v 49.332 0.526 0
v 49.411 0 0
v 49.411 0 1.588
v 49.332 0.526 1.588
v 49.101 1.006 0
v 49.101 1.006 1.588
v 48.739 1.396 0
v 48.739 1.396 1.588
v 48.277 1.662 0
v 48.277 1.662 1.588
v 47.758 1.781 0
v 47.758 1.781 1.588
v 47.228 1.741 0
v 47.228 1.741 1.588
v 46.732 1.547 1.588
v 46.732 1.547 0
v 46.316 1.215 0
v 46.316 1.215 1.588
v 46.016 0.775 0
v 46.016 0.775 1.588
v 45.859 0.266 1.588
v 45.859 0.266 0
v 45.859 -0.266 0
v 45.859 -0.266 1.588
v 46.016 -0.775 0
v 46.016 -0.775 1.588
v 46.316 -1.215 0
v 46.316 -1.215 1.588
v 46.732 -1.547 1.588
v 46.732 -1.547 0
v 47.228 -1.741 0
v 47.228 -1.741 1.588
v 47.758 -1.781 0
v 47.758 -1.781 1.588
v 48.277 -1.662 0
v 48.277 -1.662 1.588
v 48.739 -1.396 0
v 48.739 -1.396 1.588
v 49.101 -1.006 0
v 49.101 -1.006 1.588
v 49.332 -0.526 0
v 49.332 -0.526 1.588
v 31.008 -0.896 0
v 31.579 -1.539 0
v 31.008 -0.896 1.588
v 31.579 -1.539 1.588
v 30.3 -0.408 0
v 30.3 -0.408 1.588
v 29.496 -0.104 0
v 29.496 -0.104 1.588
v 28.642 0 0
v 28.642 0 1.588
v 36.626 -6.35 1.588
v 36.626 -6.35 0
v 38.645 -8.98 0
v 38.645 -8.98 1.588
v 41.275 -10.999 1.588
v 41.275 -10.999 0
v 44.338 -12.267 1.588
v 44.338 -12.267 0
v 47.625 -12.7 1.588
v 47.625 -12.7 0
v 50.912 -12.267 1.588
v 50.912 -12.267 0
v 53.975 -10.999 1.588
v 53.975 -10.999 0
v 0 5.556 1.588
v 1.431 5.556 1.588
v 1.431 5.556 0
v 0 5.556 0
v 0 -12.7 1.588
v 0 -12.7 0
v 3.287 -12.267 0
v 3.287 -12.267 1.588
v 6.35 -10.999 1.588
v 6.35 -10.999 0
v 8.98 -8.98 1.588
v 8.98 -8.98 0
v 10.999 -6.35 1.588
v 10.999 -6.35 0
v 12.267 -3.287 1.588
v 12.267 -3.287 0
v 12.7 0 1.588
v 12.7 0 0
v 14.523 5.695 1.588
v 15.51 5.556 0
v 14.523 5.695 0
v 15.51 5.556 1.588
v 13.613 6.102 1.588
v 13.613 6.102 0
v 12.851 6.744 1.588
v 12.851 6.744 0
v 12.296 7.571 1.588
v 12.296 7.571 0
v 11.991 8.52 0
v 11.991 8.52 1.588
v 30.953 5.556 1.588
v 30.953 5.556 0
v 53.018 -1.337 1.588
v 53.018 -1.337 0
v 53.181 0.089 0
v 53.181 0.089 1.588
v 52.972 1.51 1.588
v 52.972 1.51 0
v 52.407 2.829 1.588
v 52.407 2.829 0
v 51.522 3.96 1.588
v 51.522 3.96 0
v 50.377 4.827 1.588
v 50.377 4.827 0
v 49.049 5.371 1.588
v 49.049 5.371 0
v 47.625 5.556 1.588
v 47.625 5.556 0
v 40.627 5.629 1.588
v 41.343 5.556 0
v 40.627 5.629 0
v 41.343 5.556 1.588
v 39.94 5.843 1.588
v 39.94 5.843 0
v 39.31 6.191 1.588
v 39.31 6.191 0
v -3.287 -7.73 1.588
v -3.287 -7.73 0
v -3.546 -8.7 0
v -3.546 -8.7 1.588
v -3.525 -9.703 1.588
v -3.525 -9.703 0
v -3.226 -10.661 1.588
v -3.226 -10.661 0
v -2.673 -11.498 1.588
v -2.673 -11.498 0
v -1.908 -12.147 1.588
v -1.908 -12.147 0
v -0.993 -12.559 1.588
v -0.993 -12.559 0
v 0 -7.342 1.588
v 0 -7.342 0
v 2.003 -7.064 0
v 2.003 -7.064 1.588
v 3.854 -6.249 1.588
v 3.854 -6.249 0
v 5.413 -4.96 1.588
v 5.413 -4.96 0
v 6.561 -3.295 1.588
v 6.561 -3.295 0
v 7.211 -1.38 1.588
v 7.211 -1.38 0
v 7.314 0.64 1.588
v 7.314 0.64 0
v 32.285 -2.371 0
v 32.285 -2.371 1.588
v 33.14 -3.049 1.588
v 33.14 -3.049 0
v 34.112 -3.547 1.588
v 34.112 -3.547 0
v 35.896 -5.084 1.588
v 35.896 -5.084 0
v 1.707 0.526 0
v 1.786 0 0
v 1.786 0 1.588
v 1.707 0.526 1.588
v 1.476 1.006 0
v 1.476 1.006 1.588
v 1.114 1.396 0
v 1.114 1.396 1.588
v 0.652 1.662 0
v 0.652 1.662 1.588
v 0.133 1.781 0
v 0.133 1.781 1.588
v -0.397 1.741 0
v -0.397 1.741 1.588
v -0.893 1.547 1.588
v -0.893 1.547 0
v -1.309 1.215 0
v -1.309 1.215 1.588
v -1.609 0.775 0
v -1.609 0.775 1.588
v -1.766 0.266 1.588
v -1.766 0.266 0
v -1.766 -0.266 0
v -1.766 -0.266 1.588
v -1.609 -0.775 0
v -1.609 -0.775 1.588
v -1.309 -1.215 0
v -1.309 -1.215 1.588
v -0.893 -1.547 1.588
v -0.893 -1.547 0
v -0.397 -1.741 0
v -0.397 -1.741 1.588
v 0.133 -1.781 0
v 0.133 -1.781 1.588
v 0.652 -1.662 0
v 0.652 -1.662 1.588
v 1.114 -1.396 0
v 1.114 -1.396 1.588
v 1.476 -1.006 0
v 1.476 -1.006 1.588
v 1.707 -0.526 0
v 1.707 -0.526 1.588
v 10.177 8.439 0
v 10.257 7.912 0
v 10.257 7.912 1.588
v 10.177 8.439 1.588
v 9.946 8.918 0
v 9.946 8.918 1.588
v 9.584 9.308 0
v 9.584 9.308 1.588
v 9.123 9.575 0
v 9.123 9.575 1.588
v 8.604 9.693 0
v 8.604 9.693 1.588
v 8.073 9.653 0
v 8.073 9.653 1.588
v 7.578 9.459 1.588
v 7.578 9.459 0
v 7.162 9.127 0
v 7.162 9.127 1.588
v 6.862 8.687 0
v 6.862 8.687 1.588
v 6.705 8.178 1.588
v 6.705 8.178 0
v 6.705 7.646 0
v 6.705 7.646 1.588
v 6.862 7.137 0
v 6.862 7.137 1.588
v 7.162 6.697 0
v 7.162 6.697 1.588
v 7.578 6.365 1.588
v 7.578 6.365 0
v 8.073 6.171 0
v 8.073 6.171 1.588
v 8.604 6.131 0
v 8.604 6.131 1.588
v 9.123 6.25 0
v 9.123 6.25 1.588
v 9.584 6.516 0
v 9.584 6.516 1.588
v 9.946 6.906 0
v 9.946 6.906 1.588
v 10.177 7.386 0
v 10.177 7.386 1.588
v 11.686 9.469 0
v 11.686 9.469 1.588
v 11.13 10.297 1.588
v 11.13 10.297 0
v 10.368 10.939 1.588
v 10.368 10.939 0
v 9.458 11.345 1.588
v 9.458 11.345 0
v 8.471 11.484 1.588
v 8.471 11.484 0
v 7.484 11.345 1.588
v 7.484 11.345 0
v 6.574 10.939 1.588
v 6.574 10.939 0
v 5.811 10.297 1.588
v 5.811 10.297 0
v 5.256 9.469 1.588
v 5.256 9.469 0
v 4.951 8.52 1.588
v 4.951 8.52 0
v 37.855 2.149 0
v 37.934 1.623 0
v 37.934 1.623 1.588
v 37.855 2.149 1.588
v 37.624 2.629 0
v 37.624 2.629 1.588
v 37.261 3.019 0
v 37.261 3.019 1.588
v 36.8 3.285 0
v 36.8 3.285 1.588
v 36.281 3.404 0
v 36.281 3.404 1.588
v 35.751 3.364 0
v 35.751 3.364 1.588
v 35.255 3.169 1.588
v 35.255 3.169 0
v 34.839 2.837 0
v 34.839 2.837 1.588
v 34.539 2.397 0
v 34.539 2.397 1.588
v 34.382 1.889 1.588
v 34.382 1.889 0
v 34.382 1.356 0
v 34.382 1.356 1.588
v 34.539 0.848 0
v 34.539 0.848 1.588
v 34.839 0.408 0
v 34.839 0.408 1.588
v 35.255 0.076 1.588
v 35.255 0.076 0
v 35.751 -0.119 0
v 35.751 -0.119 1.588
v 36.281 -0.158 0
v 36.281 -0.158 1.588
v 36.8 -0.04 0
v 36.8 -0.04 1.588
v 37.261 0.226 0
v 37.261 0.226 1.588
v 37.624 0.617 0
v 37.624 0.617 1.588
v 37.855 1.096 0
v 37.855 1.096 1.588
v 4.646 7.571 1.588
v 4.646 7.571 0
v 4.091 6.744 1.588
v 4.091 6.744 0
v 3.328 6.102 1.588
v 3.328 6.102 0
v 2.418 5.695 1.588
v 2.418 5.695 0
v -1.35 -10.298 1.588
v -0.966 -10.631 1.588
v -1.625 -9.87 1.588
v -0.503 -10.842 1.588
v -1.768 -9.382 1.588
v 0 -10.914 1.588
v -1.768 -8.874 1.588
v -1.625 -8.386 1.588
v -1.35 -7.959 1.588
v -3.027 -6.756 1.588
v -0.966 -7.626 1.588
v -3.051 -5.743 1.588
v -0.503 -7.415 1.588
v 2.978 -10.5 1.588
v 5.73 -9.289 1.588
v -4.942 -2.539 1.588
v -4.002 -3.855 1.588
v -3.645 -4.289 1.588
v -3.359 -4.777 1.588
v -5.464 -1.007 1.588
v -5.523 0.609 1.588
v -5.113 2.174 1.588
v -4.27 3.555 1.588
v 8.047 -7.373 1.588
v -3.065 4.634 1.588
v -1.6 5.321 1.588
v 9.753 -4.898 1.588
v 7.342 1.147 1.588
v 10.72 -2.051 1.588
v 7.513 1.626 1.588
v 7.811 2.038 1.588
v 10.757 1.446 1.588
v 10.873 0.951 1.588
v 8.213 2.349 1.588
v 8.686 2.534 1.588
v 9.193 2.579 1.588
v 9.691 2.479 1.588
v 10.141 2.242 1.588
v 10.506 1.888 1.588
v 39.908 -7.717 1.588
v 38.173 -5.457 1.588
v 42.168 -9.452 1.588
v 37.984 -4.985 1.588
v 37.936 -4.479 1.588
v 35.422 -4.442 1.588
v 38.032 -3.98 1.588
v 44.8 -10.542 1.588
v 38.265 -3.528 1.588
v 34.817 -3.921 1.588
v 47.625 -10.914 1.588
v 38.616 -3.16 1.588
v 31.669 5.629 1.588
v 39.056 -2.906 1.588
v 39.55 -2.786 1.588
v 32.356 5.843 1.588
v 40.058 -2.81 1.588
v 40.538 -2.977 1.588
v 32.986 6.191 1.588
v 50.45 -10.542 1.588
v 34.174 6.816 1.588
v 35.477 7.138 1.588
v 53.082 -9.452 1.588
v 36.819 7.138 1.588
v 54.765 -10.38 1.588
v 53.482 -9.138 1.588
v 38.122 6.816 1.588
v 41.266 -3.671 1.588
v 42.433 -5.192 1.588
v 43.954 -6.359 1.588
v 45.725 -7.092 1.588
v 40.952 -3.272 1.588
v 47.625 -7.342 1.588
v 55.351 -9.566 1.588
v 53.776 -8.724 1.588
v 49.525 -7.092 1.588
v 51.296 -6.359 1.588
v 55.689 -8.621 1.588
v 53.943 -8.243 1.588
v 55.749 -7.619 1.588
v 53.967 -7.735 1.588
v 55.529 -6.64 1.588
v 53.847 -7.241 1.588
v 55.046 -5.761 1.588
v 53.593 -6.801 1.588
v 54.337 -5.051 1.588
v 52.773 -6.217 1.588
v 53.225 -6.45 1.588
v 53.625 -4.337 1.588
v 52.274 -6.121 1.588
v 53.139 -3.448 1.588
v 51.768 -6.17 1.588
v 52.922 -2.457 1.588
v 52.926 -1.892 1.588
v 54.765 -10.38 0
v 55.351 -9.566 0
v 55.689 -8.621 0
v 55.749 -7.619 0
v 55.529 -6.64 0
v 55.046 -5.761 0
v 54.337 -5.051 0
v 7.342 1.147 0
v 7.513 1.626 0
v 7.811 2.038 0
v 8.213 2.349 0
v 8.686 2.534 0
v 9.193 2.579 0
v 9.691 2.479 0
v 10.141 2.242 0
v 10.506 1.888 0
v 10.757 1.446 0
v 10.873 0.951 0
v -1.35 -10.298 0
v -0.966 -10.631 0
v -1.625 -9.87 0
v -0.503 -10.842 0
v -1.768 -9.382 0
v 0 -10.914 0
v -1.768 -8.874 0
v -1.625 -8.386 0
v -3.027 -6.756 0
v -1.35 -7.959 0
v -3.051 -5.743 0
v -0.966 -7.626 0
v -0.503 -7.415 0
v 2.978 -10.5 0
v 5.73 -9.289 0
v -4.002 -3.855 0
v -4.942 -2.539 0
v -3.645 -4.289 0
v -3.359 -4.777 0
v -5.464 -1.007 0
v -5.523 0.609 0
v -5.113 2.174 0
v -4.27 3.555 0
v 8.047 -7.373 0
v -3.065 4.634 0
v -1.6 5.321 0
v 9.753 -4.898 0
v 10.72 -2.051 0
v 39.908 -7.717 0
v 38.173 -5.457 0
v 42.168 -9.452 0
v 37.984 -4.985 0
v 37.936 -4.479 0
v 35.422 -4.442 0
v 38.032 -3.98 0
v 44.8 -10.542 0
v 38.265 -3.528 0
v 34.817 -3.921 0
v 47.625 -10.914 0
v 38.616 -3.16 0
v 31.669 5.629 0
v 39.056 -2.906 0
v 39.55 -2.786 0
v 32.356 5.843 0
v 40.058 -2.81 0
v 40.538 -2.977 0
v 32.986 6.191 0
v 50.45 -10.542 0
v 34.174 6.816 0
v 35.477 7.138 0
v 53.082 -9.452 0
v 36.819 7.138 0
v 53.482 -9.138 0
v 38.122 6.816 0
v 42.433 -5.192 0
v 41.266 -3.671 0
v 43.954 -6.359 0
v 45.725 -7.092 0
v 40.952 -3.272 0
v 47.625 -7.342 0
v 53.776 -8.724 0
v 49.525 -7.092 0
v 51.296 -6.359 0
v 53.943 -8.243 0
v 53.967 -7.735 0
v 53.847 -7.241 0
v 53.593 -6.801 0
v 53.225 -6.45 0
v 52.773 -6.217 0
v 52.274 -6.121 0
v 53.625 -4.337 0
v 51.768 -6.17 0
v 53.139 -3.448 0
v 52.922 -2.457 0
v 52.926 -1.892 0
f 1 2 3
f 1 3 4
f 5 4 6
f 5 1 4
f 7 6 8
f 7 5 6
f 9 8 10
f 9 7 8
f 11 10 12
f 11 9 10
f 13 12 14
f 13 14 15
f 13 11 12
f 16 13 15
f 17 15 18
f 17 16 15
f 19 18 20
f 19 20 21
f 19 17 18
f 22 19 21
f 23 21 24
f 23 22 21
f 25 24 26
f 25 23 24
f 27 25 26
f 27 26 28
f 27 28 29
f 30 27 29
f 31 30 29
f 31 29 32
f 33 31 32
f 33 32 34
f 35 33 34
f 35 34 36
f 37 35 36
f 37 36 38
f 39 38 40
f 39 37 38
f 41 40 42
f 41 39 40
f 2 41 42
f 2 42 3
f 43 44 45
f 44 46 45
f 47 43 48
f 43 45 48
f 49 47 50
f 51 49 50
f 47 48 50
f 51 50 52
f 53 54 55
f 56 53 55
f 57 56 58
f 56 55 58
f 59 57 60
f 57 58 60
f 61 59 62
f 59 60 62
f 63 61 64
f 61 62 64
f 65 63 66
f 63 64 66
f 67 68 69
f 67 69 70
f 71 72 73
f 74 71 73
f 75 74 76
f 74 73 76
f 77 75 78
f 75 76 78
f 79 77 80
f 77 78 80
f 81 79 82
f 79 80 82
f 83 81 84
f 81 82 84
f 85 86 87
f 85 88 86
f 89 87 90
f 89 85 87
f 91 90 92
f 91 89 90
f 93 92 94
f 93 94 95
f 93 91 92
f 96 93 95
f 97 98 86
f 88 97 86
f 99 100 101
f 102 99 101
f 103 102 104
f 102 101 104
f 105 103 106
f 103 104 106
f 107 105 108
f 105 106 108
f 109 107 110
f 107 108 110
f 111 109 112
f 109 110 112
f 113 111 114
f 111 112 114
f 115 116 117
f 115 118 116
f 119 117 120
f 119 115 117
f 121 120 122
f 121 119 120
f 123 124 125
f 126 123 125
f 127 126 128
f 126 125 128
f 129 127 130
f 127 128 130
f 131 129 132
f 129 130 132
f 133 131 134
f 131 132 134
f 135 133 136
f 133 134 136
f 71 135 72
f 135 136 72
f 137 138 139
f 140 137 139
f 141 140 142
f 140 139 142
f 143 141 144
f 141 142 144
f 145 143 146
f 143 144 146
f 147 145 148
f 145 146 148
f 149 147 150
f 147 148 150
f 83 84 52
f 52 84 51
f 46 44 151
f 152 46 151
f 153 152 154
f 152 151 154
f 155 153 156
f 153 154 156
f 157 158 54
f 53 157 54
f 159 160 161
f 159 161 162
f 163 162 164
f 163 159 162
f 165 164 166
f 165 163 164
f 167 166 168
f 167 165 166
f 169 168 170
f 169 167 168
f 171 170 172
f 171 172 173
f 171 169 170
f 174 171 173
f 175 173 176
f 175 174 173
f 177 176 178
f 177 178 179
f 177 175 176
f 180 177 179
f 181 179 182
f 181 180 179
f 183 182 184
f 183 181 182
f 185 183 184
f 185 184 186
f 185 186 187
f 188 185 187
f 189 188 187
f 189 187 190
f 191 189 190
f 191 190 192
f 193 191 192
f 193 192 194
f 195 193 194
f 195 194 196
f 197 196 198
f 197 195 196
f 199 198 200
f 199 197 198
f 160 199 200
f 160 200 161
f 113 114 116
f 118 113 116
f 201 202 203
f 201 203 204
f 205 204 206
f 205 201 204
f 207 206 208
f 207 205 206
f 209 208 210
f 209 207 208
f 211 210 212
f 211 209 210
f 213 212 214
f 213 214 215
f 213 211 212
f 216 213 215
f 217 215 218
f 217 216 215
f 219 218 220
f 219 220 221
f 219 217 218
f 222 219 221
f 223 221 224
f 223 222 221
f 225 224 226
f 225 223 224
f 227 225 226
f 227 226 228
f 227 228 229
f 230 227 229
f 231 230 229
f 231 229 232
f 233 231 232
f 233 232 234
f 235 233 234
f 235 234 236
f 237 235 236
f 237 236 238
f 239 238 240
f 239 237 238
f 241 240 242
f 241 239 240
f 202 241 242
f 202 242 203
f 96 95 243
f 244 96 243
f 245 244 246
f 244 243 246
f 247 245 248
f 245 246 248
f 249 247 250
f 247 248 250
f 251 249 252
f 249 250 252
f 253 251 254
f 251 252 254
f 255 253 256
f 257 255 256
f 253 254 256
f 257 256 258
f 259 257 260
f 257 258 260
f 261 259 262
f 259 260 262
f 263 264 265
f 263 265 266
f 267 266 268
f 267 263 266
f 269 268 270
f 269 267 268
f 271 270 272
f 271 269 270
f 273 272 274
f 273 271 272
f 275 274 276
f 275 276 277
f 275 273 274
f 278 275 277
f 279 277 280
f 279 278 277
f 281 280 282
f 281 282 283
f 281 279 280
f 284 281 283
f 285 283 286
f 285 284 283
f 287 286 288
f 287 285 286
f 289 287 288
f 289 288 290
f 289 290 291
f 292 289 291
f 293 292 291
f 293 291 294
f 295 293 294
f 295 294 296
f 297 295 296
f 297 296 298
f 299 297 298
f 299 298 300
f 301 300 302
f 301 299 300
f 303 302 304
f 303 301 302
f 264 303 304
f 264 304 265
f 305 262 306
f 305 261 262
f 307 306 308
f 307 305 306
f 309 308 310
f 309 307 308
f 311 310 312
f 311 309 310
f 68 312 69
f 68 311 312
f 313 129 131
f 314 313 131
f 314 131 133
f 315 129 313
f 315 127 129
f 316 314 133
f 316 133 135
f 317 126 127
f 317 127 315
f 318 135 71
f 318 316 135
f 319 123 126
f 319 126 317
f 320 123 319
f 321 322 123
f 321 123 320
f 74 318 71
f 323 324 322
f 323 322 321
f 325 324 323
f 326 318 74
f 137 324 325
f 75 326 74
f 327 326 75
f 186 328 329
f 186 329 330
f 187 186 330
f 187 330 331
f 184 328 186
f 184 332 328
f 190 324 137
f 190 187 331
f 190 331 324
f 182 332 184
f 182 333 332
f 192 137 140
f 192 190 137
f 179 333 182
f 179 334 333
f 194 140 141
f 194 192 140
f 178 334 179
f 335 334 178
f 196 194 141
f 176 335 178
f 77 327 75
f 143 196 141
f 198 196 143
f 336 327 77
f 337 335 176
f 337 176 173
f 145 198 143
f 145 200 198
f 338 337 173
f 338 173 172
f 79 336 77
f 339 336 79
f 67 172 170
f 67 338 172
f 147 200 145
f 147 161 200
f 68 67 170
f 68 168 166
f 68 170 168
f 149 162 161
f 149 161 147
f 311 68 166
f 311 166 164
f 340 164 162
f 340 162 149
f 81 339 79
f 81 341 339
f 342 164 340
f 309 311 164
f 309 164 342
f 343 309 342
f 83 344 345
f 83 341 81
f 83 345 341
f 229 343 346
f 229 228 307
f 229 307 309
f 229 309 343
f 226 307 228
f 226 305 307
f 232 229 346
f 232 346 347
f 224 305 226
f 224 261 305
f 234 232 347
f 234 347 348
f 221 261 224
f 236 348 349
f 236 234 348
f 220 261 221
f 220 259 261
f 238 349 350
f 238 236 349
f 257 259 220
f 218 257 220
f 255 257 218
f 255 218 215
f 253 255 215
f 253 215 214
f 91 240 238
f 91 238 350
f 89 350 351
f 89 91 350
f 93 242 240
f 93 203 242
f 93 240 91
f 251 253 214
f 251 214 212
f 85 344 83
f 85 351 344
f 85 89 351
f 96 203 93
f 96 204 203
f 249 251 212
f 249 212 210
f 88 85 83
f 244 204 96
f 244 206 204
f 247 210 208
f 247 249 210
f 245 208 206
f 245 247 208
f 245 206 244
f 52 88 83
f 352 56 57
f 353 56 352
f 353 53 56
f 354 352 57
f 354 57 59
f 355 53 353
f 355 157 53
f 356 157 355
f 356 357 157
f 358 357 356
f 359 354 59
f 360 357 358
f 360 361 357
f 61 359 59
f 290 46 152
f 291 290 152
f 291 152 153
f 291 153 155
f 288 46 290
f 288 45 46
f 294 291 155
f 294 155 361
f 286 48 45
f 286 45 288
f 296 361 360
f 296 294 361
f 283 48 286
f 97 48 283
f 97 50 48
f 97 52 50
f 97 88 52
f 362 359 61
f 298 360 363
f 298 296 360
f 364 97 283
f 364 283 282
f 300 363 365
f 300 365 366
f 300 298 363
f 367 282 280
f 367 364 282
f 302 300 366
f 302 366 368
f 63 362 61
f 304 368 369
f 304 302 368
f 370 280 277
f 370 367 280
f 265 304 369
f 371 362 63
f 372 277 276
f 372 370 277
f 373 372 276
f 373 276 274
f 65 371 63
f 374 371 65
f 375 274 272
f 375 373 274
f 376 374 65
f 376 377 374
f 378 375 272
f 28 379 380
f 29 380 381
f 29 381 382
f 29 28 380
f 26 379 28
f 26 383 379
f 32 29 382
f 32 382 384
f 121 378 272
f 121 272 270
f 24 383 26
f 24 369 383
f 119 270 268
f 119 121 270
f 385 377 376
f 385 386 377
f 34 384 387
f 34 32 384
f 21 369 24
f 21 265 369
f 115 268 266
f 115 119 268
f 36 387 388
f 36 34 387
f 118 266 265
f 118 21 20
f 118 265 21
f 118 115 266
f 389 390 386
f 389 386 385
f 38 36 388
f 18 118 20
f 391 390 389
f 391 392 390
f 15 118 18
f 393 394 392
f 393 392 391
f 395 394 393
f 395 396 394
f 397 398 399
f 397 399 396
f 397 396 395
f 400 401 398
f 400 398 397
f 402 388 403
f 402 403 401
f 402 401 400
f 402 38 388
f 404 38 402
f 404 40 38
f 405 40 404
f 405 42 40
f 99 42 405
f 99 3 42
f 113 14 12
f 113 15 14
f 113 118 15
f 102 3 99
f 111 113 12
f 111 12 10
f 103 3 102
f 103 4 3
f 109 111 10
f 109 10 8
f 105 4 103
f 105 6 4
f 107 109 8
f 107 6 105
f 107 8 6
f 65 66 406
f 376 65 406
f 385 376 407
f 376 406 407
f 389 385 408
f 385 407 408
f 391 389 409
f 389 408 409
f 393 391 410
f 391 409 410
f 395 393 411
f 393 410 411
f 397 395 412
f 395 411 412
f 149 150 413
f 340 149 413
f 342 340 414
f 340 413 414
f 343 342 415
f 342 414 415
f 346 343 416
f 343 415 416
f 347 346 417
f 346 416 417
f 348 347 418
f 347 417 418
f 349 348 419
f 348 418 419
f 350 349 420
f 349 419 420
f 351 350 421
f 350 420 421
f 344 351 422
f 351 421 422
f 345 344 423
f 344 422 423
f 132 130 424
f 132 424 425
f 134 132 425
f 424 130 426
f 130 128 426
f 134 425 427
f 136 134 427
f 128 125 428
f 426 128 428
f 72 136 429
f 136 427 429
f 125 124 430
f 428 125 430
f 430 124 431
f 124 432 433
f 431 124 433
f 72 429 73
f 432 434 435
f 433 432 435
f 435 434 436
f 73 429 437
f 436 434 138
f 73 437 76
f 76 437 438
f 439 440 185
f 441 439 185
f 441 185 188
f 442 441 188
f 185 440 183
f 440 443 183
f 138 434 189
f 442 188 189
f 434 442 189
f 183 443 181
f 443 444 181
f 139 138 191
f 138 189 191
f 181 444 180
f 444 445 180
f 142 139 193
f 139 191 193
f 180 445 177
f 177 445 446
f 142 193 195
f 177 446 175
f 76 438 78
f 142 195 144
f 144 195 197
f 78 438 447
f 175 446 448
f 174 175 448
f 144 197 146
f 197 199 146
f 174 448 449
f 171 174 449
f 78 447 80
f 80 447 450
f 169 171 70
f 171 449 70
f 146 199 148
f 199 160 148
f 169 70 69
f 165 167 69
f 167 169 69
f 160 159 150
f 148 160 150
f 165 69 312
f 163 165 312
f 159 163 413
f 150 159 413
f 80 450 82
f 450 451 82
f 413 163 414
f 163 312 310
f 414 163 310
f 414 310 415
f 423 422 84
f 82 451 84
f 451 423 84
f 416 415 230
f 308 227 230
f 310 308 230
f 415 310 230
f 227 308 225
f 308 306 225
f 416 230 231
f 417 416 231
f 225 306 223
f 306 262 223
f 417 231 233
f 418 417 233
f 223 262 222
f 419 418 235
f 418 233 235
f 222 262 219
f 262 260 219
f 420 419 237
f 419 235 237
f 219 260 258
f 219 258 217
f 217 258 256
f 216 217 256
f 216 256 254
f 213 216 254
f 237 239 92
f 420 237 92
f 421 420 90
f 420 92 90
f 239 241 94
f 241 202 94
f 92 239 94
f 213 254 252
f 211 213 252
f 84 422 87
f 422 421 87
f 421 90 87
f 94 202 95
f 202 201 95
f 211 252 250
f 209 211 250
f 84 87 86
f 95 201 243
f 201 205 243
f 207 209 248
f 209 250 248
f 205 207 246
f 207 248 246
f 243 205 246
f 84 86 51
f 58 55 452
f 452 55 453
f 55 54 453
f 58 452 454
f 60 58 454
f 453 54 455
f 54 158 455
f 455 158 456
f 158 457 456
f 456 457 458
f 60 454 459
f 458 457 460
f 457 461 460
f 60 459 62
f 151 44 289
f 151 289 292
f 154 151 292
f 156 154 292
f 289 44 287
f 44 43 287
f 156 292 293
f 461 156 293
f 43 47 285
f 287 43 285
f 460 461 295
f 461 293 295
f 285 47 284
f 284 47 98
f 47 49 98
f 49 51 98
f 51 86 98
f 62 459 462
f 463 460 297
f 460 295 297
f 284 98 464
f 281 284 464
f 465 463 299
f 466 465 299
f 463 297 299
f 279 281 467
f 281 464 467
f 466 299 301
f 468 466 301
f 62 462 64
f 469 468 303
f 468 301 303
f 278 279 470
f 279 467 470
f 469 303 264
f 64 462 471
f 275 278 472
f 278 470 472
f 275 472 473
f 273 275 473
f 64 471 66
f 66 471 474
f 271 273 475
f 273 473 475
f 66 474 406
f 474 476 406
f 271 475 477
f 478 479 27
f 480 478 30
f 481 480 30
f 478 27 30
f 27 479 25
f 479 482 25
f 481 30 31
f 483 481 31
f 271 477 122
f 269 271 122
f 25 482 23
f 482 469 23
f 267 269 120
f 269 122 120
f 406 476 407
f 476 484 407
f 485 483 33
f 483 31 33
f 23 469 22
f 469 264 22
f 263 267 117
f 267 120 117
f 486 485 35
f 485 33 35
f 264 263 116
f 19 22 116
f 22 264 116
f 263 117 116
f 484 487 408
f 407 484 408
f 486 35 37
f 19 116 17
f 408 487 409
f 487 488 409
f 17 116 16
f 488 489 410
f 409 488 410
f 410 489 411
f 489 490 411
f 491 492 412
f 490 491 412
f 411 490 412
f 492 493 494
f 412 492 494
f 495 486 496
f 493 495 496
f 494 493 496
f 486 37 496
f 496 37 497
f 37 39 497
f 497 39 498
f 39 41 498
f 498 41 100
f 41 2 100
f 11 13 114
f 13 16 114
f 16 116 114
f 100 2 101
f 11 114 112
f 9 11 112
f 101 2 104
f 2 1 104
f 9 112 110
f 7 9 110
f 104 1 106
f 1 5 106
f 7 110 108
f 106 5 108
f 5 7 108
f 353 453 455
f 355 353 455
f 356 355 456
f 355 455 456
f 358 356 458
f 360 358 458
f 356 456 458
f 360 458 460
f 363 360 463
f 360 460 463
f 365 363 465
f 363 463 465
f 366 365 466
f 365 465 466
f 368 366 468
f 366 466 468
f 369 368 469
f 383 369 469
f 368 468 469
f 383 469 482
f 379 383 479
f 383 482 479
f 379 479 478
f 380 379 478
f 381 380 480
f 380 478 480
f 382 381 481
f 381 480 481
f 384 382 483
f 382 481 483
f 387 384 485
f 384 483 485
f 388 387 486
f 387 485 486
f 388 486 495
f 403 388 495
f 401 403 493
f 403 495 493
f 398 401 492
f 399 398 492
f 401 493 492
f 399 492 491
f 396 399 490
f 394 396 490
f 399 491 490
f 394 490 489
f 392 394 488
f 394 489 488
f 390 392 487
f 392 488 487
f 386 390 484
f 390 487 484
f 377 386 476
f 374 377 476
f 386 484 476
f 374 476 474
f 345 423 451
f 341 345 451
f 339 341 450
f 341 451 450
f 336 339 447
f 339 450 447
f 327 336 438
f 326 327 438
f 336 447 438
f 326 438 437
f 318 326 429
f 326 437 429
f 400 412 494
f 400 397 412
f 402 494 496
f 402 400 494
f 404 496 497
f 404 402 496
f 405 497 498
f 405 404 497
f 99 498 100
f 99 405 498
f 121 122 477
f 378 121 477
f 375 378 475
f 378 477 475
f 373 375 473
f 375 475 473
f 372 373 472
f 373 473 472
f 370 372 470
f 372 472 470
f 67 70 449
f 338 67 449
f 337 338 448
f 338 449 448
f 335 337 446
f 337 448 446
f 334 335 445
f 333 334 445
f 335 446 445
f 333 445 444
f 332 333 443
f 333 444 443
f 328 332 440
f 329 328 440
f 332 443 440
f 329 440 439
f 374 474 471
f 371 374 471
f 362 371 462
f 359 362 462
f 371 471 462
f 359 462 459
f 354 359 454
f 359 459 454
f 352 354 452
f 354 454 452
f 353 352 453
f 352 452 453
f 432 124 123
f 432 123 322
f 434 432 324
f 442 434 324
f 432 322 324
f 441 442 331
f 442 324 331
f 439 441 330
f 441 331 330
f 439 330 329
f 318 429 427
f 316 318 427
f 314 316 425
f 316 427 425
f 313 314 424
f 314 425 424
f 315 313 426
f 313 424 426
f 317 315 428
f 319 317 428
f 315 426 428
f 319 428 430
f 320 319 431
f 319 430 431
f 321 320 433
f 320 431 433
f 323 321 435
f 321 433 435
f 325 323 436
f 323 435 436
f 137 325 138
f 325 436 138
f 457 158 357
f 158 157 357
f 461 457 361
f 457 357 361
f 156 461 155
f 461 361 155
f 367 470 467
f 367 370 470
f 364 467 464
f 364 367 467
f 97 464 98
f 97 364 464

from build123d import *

# Parameters (mm, degrees)
SKETCH1_R           = 1.7859375
BOSS_EXTRUDE1_DEPTH = 1.5875
FILLET1_R           = 3.571875


with BuildPart() as part:
    # Sketch1 → Boss-Extrude1 (new body)
    with BuildSketch(Plane.XY):
        with BuildLine():
            ThreePointArc((53.975, -10.998522628), (55.282397014, -6.119250683), (50.403125088, -4.811853599))
            ThreePointArc((50.403125088, -4.811853599), (52.991925359, 1.438063368), (47.625, 5.55625))
            Line((47.625, 5.55625), (40.072011619, 5.55625))
            ThreePointArc((40.072011619, 5.55625), (36.147936861, 7.178856478), (32.223862103, 5.55625))
            Line((32.223862103, 5.55625), (11.155561342, 5.55625))
            ThreePointArc((11.155561342, 5.55625), (8.470770891, 11.484009389), (5.785980441, 5.55625))
            Line((5.785980441, 5.55625), (0, 5.55625))
            ThreePointArc((0, 5.55625), (-5.55625, 0), (0, -5.55625))
            ThreePointArc((0, -5.55625), (-3.571875, -9.128125), (0, -12.7))
            ThreePointArc((0, -12.7), (8.980256121, -8.980256121), (12.7, 0))
            Line((12.7, 0), (30.833892989, 0))
            ThreePointArc((30.833892989, 0), (32.465327803, -2.537958939), (35.182607485, -3.849143997))
            Line((35.182607485, -3.849143997), (36.626477372, -6.35))
            ThreePointArc((36.626477372, -6.35), (44.337998127, -12.267257994), (53.975, -10.998522628))
        make_face()
        with BuildLine():
            ThreePointArc((0, -10.9140625), (-1.7859375, -9.128125), (0, -7.3421875))
            ThreePointArc((0, -7.3421875), (5.413228446, -4.960309977), (7.31424826, 0.639913805))
            ThreePointArc((7.31424826, 0.639913805), (8.937735019, 2.574709983), (10.872531197, 0.951223224))
            ThreePointArc((10.872531197, 0.951223224), (8.046690934, -7.37343375), (0, -10.9140625))
        make_face(mode=Mode.SUBTRACT)
        with BuildLine():
            ThreePointArc((51.29609375, -6.358520894), (53.735729745, -7.012219389), (53.08203125, -9.451855383))
            ThreePointArc((53.08203125, -9.451855383), (44.800232766, -10.542174838), (38.173144617, -5.45703125))
            ThreePointArc((38.173144617, -5.45703125), (38.826843111, -3.017395255), (41.266479106, -3.67109375))
            ThreePointArc((41.266479106, -3.67109375), (45.724702042, -7.092008528), (51.29609375, -6.358520894))
        make_face(mode=Mode.SUBTRACT)
        Circle(SKETCH1_R, mode=Mode.SUBTRACT)
        with Locations((8.470770891, 7.912134389)):
            Circle(SKETCH1_R, mode=Mode.SUBTRACT)
        with Locations((36.147936861, 1.622606478)):
            Circle(SKETCH1_R, mode=Mode.SUBTRACT)
        with Locations((47.625, 0)):
            Circle(SKETCH1_R, mode=Mode.SUBTRACT)
    extrude(amount=BOSS_EXTRUDE1_DEPTH)

    # Fillet1
    fillet1_edges = [part.edges().sort_by_distance(p)[0] for p in [
        (5.785980441, 5.55625, 0.79375),
        (11.155561342, 5.55625, 0.79375),
        (32.223862103, 5.55625, 0.79375),
        (40.072011619, 5.55625, 0.79375),
        (50.403125088, -4.811853599, 0.79375),
        (35.182607485, -3.849143997, 0.79375),
        (30.833892989, 0, 0.79375),
        (0, -5.55625, 0.79375),
    ]]
    fillet(fillet1_edges, radius=FILLET1_R)


solid = part.part
